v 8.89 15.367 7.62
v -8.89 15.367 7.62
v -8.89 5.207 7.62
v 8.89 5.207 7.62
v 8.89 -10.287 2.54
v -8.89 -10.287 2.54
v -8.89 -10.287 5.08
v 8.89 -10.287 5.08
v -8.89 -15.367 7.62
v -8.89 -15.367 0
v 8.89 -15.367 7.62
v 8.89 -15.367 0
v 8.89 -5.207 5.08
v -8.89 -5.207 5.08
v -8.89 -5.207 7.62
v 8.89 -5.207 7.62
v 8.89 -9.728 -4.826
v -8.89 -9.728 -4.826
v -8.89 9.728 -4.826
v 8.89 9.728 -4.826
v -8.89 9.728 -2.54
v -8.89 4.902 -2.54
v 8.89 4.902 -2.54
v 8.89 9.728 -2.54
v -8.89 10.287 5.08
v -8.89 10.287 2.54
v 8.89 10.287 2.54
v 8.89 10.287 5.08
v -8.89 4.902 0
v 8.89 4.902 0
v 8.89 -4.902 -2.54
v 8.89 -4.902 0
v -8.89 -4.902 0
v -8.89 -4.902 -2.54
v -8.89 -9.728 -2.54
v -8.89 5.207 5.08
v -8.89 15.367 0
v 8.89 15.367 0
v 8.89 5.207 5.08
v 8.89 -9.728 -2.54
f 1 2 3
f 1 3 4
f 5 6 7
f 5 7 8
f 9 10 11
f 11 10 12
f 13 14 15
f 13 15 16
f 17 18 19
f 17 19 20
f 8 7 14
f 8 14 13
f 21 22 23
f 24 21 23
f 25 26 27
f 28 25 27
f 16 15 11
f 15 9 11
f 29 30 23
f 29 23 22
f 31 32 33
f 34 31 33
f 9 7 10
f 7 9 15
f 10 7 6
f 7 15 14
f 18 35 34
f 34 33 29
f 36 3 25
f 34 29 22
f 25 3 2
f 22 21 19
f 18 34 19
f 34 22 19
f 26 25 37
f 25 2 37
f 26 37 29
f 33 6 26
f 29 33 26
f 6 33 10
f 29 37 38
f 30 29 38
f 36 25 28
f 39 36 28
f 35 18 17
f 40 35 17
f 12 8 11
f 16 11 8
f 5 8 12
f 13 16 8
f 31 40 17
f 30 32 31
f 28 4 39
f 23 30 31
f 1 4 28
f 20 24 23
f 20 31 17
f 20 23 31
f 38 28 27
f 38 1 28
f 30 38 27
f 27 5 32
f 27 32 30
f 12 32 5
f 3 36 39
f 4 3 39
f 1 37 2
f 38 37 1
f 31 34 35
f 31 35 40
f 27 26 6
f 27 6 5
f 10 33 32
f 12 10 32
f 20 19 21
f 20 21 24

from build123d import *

# Parameters (mm, degrees)
SKETCH1_W           = 17.78
SKETCH1_H           = 30.734
BOSS_EXTRUDE1_DEPTH = 2.54
SKETCH2_W           = 17.78
SKETCH2_H           = 5.08
BOSS_EXTRUDE2_DEPTH = 5.08
SKETCH3_W           = 17.78
SKETCH3_H           = 2.54
BOSS_EXTRUDE3_DEPTH = 5.08
SKETCH4_W           = 17.78
SKETCH4_H           = 9.8044
BOSS_EXTRUDE4_DEPTH = 4.826
SKETCH5_W           = 17.78
SKETCH5_H           = 2.286
BOSS_EXTRUDE5_DEPTH = 4.826


with BuildPart() as part:
    # Sketch1 → Boss-Extrude1 (new body)
    with BuildSketch(Plane.XY):
        Rectangle(SKETCH1_W, SKETCH1_H)
    extrude(amount=BOSS_EXTRUDE1_DEPTH)

    # Sketch2 → Boss-Extrude2 (add)
    with BuildSketch(Plane.XY.offset(2.54)):
        with Locations((0, -12.827)):
            Rectangle(SKETCH2_W, SKETCH2_H)
    boss_extrude2 = extrude(amount=BOSS_EXTRUDE2_DEPTH)

    # Sketch3 → Boss-Extrude3 (add)
    with BuildSketch(Plane(origin=(0, -10.287, 0), x_dir=(1, 0, 0), z_dir=(0, 1, 0))):
        with Locations((0, -6.35)):
            Rectangle(SKETCH3_W, SKETCH3_H)
    boss_extrude3 = extrude(amount=BOSS_EXTRUDE3_DEPTH)

    # Mirror1: Boss-Extrude2, Boss-Extrude3 across plane
    add(boss_extrude2.mirror(Plane.ZX))
    add(boss_extrude3.mirror(Plane.ZX))

    # Sketch4 → Boss-Extrude4 (add)
    with BuildSketch(Plane(origin=(0, 0, 0), x_dir=(-1, 0, 0), z_dir=(0, 0, -1))):
        Rectangle(SKETCH4_W, SKETCH4_H)
    boss_extrude4 = extrude(amount=BOSS_EXTRUDE4_DEPTH)

    # Sketch5 → Boss-Extrude5 (add)
    with BuildSketch(Plane(origin=(0, 4.9022, 0), x_dir=(1, 0, 0), z_dir=(0, 1, 0))):
        with Locations((0, 3.683)):
            Rectangle(SKETCH5_W, SKETCH5_H)
    boss_extrude5 = extrude(amount=BOSS_EXTRUDE5_DEPTH)

    # Mirror2: Boss-Extrude4, Boss-Extrude5 across plane
    add(boss_extrude4.mirror(Plane.ZX))
    add(boss_extrude5.mirror(Plane.ZX))


solid = part.part
